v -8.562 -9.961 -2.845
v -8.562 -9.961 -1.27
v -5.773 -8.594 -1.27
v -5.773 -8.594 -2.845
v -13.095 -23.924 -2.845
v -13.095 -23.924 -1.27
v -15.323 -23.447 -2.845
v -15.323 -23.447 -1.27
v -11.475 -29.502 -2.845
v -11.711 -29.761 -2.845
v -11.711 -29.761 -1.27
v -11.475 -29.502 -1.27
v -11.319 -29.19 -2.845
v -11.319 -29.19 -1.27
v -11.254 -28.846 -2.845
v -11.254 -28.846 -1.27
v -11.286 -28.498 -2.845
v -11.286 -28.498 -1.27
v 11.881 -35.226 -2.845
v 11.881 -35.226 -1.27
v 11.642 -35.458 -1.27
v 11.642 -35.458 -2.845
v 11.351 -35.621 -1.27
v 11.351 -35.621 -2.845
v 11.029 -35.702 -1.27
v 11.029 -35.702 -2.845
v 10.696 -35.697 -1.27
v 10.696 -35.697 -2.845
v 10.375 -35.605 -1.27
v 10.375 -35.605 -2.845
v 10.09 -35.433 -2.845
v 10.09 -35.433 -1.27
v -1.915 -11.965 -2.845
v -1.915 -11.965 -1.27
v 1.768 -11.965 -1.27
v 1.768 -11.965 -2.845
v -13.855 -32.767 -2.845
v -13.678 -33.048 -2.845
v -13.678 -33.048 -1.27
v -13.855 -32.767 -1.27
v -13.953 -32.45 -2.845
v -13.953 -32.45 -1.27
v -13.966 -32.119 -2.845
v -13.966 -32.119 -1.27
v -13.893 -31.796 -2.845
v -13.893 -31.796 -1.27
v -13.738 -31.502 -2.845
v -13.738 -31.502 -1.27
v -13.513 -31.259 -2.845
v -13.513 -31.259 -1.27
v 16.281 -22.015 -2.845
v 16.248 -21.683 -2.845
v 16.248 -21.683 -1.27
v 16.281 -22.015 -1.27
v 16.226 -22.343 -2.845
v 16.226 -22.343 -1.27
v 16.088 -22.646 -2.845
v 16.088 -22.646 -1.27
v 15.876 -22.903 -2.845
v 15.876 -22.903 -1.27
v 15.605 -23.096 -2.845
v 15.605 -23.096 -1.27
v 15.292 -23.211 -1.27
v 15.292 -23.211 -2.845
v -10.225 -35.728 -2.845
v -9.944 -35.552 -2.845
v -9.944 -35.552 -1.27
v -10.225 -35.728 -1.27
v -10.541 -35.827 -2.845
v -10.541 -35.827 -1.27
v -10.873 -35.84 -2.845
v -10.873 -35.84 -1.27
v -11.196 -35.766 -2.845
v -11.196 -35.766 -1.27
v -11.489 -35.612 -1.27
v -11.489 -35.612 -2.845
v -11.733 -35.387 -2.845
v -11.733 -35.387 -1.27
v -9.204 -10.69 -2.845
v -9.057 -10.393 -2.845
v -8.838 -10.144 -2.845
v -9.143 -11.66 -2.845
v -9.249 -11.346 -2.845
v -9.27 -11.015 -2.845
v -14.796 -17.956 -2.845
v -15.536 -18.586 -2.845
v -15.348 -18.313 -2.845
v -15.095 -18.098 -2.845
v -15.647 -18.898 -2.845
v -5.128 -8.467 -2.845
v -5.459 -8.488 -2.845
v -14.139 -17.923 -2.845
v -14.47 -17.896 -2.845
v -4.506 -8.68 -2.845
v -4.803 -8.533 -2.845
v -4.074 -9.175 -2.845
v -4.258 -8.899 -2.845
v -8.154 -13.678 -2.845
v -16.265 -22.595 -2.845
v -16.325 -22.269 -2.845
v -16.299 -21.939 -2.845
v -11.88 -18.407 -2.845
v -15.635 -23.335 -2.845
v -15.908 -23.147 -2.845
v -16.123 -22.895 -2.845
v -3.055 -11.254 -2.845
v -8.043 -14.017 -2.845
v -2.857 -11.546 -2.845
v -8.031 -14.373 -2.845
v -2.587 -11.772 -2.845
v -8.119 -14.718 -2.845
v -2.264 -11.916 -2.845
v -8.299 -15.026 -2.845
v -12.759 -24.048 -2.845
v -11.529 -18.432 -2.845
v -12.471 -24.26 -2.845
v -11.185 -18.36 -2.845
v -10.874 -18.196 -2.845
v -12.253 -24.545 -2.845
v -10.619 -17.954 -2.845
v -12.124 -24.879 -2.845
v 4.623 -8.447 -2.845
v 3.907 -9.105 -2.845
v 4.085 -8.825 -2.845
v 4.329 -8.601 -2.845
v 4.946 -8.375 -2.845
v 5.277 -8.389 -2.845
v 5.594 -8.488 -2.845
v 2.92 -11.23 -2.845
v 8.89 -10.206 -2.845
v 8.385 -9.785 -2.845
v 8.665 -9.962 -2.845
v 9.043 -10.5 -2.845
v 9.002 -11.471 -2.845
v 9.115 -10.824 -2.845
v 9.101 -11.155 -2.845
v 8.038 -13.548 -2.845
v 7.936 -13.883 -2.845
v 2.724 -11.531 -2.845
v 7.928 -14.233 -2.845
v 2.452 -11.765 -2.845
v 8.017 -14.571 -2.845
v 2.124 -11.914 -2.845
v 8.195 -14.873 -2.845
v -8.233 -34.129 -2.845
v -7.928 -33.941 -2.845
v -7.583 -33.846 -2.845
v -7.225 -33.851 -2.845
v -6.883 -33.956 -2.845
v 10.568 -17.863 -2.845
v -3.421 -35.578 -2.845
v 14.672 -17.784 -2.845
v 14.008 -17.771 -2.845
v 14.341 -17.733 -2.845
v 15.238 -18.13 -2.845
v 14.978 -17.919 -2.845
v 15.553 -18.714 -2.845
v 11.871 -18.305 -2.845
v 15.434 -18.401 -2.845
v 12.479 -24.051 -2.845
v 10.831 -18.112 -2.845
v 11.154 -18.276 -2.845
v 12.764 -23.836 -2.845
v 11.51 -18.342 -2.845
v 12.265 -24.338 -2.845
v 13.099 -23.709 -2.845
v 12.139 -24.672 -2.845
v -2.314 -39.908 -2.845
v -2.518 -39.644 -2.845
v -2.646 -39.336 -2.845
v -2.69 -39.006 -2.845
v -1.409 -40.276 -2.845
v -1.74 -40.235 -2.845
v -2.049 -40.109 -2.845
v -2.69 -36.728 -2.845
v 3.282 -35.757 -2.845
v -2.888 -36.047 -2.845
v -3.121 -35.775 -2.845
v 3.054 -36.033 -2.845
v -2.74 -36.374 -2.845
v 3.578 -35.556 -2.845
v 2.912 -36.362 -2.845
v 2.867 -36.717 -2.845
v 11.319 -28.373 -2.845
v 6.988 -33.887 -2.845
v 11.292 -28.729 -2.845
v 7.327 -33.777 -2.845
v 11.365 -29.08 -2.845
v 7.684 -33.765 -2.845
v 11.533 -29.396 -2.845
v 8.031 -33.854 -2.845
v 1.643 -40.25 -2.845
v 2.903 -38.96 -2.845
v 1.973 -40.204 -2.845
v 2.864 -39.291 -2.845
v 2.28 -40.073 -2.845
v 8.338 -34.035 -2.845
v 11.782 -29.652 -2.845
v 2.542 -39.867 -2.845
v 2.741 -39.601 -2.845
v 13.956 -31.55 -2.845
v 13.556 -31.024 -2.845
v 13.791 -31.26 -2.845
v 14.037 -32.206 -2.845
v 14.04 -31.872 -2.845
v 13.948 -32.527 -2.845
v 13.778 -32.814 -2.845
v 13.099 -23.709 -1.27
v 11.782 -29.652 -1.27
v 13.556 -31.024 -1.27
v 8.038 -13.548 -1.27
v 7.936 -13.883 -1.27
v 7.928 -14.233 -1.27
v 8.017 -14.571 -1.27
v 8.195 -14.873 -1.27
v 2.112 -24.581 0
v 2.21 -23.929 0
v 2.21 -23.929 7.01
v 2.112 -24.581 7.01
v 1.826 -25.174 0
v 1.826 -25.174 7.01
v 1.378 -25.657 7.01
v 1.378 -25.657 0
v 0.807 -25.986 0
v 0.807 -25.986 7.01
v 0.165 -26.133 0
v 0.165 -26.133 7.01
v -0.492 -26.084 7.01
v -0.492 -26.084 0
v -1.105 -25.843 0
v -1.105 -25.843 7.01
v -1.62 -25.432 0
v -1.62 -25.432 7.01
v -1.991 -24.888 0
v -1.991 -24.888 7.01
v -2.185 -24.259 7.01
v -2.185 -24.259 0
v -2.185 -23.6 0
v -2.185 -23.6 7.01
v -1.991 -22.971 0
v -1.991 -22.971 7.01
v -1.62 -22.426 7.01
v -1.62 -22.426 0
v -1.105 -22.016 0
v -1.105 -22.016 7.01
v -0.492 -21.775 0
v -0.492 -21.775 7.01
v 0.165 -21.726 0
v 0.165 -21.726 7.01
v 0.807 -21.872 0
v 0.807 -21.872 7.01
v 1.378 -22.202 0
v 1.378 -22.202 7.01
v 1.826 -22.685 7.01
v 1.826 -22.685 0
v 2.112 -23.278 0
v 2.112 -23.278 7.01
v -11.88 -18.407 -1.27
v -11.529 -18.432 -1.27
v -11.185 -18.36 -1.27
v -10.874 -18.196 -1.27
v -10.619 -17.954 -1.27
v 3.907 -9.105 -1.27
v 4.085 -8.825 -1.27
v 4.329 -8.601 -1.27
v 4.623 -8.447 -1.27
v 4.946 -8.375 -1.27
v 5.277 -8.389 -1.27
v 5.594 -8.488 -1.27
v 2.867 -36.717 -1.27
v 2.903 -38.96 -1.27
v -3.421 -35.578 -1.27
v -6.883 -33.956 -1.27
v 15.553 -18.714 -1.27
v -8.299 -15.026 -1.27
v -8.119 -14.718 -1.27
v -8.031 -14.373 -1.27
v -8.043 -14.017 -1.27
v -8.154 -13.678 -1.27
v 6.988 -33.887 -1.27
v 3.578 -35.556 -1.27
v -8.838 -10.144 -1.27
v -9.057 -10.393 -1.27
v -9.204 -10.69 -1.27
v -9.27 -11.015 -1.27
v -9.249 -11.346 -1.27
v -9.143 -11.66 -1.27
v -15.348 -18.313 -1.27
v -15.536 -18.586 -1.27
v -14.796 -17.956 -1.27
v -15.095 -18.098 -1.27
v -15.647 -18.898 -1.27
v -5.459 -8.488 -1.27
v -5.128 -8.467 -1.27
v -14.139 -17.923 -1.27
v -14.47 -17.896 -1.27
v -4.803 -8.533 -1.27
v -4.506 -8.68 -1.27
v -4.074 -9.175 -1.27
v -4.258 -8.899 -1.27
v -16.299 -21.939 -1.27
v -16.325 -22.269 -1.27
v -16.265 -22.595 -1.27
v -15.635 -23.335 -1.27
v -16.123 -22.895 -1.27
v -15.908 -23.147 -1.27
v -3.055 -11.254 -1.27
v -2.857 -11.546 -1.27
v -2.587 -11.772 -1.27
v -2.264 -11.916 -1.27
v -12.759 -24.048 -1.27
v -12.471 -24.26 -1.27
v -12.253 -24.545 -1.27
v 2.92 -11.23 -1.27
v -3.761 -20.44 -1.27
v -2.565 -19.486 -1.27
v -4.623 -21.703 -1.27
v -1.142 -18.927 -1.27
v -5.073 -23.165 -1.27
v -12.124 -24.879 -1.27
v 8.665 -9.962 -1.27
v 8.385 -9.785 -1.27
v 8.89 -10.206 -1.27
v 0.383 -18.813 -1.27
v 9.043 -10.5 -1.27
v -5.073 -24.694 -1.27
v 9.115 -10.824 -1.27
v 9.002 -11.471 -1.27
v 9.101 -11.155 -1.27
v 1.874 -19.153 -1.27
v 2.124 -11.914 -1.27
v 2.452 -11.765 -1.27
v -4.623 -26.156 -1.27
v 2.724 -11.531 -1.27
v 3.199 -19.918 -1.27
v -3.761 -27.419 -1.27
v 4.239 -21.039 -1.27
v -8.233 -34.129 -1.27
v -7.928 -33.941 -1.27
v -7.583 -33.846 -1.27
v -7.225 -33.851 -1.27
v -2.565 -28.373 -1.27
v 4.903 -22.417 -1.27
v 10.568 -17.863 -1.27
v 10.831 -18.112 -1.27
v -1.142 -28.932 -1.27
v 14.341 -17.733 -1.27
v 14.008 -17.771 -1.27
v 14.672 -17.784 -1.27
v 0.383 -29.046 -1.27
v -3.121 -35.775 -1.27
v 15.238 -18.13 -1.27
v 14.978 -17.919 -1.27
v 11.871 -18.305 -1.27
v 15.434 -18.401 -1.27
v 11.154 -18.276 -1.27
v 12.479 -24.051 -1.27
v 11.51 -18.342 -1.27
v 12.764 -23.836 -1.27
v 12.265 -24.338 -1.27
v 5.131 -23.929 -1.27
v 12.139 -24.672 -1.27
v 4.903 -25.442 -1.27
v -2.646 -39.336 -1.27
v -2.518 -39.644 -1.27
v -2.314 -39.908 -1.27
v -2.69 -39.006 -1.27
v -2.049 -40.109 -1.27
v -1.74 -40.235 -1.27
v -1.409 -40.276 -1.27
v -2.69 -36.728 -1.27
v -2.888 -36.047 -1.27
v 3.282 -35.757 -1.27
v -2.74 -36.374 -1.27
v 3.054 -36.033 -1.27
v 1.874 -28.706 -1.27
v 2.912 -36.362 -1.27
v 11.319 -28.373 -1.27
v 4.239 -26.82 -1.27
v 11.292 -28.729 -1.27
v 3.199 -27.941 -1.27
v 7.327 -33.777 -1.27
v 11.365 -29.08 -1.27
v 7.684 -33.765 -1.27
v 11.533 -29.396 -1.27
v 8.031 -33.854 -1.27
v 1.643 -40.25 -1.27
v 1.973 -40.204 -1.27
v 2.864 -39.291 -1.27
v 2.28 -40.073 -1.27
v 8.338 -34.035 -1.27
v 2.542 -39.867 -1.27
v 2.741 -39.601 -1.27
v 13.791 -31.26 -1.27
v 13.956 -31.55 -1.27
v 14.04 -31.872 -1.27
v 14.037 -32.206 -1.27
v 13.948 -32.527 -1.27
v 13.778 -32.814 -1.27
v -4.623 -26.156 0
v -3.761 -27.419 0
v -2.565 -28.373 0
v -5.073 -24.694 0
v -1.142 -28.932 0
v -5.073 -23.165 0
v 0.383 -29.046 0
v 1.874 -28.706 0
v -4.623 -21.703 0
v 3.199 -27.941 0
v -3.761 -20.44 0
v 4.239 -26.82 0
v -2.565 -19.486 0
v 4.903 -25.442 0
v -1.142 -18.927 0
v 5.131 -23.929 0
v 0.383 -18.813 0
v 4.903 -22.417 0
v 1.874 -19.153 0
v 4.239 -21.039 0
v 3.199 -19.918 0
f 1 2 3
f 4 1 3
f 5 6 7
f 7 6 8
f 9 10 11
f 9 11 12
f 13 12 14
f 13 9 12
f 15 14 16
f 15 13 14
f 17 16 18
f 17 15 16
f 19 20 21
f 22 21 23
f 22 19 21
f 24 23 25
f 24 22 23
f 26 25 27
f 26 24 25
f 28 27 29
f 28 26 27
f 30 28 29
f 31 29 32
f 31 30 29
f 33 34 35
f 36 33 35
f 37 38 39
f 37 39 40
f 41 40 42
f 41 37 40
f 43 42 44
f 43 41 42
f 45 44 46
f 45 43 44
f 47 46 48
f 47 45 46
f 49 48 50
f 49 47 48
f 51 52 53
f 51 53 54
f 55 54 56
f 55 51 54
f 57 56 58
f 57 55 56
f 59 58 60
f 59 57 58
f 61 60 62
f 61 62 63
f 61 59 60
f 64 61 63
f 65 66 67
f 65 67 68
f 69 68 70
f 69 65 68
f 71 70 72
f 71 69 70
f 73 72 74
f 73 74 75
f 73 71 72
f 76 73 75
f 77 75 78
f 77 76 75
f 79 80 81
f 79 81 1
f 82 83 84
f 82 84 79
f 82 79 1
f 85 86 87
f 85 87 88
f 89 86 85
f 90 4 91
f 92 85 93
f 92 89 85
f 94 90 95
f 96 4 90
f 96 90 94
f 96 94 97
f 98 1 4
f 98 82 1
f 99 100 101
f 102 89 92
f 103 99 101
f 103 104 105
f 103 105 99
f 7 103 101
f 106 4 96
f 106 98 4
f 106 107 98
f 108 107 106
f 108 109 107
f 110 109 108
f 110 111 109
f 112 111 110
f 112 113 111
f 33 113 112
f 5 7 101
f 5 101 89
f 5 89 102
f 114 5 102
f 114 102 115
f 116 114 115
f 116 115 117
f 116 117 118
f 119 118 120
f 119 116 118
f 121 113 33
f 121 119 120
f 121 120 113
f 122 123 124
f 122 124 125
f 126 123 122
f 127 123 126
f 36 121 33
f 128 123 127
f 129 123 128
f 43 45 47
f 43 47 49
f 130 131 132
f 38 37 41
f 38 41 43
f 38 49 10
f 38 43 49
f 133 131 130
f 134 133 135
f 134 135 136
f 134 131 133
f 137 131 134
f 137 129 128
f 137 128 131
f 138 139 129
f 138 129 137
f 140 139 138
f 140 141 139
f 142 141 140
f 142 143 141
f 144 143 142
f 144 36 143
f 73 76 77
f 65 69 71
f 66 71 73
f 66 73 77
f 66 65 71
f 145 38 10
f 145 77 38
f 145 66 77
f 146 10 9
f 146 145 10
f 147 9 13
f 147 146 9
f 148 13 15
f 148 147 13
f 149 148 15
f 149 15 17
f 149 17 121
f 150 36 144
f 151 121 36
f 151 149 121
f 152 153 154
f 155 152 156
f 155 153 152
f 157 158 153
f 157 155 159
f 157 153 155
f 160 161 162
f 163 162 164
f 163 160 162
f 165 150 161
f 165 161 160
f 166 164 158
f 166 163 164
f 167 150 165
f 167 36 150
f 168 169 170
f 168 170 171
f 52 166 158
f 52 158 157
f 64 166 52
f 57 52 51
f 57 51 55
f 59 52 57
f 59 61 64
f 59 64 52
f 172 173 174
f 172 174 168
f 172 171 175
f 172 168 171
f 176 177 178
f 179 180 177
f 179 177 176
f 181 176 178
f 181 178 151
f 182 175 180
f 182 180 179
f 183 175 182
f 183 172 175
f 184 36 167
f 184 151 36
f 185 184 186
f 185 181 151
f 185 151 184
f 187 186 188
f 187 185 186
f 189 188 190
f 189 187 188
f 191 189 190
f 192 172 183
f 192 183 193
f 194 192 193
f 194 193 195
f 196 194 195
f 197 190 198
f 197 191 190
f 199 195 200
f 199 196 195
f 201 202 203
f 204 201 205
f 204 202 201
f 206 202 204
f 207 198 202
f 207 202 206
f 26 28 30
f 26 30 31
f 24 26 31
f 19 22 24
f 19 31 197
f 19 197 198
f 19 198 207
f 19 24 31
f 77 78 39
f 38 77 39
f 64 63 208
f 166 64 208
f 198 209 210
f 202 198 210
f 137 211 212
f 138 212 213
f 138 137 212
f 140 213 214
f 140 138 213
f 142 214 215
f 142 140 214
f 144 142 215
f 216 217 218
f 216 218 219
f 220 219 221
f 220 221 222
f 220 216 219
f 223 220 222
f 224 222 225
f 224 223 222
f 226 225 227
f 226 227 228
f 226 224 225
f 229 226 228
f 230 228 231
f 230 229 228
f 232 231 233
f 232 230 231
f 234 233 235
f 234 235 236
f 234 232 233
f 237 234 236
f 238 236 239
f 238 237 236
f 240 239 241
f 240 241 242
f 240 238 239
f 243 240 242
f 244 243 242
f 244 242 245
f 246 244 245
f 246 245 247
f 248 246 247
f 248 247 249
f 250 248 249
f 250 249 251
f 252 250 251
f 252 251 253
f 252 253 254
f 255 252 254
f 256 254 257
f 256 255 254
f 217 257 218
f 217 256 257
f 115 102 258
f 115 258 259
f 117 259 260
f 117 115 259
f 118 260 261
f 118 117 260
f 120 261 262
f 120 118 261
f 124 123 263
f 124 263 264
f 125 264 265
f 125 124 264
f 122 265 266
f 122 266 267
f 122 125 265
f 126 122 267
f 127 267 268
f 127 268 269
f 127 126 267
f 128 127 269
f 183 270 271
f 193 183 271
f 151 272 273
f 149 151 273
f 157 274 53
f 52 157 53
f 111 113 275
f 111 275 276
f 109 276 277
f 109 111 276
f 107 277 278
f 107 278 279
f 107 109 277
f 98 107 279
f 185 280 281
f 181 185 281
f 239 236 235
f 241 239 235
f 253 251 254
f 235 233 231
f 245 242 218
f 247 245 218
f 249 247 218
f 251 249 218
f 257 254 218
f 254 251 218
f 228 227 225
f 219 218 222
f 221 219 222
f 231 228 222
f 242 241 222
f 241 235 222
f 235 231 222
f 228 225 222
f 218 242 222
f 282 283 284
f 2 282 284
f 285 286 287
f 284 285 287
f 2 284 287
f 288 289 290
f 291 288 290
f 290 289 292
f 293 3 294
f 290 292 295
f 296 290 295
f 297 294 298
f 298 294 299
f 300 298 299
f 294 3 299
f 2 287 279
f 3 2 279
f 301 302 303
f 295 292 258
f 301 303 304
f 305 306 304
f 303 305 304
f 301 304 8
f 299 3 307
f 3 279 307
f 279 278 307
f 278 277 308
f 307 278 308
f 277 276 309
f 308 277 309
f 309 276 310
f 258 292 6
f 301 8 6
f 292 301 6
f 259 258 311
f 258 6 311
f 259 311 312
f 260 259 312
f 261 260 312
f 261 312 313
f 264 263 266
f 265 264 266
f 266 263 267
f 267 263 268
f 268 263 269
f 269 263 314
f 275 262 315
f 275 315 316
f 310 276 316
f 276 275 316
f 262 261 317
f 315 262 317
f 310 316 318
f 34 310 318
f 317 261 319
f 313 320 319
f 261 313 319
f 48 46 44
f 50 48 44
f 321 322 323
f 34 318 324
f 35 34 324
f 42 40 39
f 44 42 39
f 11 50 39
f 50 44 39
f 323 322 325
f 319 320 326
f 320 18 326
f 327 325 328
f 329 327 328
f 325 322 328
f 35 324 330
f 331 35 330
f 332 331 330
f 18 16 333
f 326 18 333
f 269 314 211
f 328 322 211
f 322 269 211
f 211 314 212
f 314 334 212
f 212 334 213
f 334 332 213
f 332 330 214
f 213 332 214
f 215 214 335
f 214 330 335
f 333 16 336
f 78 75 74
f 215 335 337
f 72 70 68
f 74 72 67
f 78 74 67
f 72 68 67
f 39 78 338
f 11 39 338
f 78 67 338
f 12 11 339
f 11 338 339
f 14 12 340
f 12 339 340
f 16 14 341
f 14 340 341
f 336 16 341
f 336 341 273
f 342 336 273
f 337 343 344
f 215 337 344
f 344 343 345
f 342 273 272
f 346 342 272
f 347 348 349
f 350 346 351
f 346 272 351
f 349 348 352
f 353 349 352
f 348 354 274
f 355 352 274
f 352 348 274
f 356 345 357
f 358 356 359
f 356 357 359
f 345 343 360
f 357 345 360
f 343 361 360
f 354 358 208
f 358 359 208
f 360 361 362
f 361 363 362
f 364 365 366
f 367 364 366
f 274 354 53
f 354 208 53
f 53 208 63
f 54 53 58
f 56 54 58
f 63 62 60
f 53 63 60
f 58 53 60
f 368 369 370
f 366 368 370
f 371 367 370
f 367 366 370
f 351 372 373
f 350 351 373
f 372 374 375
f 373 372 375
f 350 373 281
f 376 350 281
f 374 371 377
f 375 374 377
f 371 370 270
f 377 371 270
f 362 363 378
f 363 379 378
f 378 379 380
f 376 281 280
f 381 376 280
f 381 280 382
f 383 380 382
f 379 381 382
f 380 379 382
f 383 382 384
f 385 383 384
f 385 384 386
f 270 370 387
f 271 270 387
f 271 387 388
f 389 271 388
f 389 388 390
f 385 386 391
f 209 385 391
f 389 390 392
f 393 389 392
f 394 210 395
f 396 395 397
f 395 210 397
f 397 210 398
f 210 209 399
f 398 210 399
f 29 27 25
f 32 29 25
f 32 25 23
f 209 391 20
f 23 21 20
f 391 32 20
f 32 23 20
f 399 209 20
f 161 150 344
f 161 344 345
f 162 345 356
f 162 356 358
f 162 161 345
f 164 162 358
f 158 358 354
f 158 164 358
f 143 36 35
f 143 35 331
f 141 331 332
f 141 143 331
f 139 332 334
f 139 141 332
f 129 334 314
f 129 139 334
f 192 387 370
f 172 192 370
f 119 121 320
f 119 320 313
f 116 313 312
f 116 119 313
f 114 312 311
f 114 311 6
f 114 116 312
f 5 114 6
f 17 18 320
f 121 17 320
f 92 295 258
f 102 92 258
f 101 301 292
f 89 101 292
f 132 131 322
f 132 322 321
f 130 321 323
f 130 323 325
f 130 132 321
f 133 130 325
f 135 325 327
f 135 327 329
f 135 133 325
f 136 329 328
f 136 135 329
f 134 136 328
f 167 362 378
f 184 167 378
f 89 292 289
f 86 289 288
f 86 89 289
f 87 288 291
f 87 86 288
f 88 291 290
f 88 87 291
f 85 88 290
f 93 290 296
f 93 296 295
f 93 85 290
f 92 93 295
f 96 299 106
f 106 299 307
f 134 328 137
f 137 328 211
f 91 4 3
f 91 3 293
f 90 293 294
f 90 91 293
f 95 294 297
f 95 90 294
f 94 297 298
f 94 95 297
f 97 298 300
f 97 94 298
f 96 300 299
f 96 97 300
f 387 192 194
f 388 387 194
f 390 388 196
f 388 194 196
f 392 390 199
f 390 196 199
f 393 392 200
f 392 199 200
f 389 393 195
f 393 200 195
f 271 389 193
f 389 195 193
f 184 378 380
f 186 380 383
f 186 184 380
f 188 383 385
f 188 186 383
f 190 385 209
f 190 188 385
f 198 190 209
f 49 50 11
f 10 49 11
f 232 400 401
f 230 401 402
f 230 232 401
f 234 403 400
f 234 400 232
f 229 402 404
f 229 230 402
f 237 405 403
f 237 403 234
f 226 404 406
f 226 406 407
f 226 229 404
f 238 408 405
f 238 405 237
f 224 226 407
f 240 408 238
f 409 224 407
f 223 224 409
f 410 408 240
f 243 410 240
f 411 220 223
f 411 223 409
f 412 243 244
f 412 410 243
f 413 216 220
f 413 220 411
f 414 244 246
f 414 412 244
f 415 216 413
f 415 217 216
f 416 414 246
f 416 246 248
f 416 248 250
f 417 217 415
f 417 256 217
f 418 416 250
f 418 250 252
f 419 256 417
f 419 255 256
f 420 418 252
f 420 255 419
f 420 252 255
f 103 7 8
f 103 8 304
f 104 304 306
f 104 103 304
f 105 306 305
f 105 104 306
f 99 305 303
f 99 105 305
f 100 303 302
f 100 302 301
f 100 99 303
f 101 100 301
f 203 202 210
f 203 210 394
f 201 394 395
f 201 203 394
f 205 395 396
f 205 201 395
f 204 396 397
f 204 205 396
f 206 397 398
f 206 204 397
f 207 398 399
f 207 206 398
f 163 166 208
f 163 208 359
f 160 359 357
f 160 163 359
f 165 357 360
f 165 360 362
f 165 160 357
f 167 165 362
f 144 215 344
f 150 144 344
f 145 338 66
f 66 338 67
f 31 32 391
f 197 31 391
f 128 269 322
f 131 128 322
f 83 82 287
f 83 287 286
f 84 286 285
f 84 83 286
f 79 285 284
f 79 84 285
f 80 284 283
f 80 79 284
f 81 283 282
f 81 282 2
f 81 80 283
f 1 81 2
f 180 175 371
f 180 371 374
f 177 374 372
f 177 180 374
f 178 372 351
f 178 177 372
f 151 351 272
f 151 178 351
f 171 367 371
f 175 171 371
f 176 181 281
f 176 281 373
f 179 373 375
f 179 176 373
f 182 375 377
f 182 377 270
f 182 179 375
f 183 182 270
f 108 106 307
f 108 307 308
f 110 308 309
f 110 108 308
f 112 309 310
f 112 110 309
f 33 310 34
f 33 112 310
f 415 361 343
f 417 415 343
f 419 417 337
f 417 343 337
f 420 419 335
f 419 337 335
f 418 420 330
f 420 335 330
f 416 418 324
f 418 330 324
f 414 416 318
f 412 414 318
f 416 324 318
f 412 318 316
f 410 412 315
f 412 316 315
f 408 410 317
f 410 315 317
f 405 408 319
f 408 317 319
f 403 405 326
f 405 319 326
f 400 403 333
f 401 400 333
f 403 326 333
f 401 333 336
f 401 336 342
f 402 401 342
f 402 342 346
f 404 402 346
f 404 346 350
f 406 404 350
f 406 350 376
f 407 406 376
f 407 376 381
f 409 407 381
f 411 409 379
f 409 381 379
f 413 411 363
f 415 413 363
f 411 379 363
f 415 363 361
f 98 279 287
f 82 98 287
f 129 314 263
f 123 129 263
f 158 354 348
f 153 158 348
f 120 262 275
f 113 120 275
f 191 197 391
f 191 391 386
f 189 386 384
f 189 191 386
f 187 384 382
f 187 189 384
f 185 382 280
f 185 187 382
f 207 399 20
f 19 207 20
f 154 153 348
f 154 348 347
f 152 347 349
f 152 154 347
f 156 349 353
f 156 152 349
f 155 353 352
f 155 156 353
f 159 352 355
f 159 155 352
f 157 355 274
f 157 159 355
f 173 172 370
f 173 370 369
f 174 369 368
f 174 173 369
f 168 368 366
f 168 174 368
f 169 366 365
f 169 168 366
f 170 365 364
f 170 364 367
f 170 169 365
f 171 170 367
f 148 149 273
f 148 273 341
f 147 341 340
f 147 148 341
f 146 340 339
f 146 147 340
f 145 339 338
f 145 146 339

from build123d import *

# Parameters (mm, degrees)
F1_DEPTH = 2.54
F2_SCALE = 1.12
F3_R     = 1.27
F4_R     = 2.2098
F5_DEPTH = 7.0104
F6_ANGLE = 180
F7_DEPTH = 1.27
F8_R     = 5.1308
F8_R_2   = 2.2098
F9_DEPTH = 1.27


with BuildPart() as f1:
    # F0 (on Top) → F1 (new body)
    with BuildSketch(Plane.XY):
        Polygon((2.6097216178, 14.5627437159), (-2.4016266689, 14.6046923473), (-2.4016266689, 10.7069099322), (-6.7973635159, 8.6464090273), (-9.7507489845, 11.1018400639), (-12.9371215583, 7.269280193), (-9.9187448393, 4.759815731), (-10.987800546, 0.1461525389), (-14.7898914292, -0.6685812259), (-13.7329729143, -5.6008676039), (-9.9187448393, -4.7835330123), (-6.9650523365, -8.5103949532), (-8.662414737, -11.9730141014), (-4.136644538, -14.1915290003), (-2.4166579341, -10.6827564792), (2.3025460541, -10.6827564792), (3.9659612812, -14.2644541338), (8.5153820935, -12.1516080526), (6.8819414162, -8.6344521752), (9.8897544667, -4.8440932296), (13.6239528656, -5.7776425965), (14.7675592452, -0.8934023208), (10.9942825511, -0.0382388607), (9.9505092949, 4.6697063372), (13.008704409, 7.0334360935), (9.9016642198, 10.9836040065), (6.8838195875, 8.5752755404), (2.5481330231, 10.6975259259), align=None)
    extrude(amount=F1_DEPTH)


with BuildPart() as f1_1:
    # F2: moved
    add(f1.part.scale(F2_SCALE))

    # F3
    f3_edges = [f1_1.edges().sort_by_distance(p)[0] for p in [
        (-16.564678, -0.748811, 1.4224),
        (-12.306337, 0.163691, 1.4224),
        (-14.489576, 8.141594, 1.4224),
        (-10.920839, 12.434061, 1.4224),
        (-7.613047, 9.683978, 1.4224),
        (-2.689822, 11.991739, 1.4224),
        (-2.689822, 16.357255, 1.4224),
        (2.922888, 16.310273, 1.4224),
        (2.853909, 11.981229, 1.4224),
        (7.709878, 9.604309, 1.4224),
        (11.089864, 12.301636, 1.4224),
        (14.569749, 7.877448, 1.4224),
        (11.14457, 5.230071, 1.4224),
        (12.313596, -0.042828, 1.4224),
        (16.539666, -1.000611, 1.4224),
        (15.258827, -6.47096, 1.4224),
        (11.076525, -5.425384, 1.4224),
        (7.707774, -9.670586, 1.4224),
        (9.537228, -13.609801, 1.4224),
        (4.441877, -15.976189, 1.4224),
        (2.578852, -11.964687, 1.4224),
        (-2.706657, -11.964687, 1.4224),
        (-4.633042, -15.894512, 1.4224),
        (-9.701905, -13.409776, 1.4224),
        (-7.800859, -9.531642, 1.4224),
        (-11.108994, -5.357557, 1.4224),
        (-15.38093, -6.272972, 1.4224),
        (-11.108994, 5.330994, 1.4224),
    ]]
    fillet(f3_edges, radius=F3_R)

    # F4 (on face) → F5 (join)
    with BuildSketch(Plane.XY):
        Circle(F4_R)
    extrude(amount=-F5_DEPTH)


with BuildPart() as f1_2:
    # F6: moved
    add(f1_1.part.rotate(Axis((-0.0732200051, -11.9646872567, 0), (1, 0, 0)), F6_ANGLE))

    # F7 (cut): a face of the model
    f7_faces = [f1_2.faces().sort_by_distance(p)[0] for p in [
        (5.0824398182, -34.3118398385, 0),
    ]]
    extrude(f7_faces, amount=-F7_DEPTH, mode=Mode.SUBTRACT)

    # F8 (on face) → F9 (join)
    with BuildSketch(Plane.XY.offset(-1.27)):
        with Locations((0, -23.9293745135)):
            Circle(F8_R)
        with Locations((0, -23.9293745135)):
            Circle(F8_R_2, mode=Mode.SUBTRACT)
    extrude(amount=F9_DEPTH)


solid = f1_2.part
